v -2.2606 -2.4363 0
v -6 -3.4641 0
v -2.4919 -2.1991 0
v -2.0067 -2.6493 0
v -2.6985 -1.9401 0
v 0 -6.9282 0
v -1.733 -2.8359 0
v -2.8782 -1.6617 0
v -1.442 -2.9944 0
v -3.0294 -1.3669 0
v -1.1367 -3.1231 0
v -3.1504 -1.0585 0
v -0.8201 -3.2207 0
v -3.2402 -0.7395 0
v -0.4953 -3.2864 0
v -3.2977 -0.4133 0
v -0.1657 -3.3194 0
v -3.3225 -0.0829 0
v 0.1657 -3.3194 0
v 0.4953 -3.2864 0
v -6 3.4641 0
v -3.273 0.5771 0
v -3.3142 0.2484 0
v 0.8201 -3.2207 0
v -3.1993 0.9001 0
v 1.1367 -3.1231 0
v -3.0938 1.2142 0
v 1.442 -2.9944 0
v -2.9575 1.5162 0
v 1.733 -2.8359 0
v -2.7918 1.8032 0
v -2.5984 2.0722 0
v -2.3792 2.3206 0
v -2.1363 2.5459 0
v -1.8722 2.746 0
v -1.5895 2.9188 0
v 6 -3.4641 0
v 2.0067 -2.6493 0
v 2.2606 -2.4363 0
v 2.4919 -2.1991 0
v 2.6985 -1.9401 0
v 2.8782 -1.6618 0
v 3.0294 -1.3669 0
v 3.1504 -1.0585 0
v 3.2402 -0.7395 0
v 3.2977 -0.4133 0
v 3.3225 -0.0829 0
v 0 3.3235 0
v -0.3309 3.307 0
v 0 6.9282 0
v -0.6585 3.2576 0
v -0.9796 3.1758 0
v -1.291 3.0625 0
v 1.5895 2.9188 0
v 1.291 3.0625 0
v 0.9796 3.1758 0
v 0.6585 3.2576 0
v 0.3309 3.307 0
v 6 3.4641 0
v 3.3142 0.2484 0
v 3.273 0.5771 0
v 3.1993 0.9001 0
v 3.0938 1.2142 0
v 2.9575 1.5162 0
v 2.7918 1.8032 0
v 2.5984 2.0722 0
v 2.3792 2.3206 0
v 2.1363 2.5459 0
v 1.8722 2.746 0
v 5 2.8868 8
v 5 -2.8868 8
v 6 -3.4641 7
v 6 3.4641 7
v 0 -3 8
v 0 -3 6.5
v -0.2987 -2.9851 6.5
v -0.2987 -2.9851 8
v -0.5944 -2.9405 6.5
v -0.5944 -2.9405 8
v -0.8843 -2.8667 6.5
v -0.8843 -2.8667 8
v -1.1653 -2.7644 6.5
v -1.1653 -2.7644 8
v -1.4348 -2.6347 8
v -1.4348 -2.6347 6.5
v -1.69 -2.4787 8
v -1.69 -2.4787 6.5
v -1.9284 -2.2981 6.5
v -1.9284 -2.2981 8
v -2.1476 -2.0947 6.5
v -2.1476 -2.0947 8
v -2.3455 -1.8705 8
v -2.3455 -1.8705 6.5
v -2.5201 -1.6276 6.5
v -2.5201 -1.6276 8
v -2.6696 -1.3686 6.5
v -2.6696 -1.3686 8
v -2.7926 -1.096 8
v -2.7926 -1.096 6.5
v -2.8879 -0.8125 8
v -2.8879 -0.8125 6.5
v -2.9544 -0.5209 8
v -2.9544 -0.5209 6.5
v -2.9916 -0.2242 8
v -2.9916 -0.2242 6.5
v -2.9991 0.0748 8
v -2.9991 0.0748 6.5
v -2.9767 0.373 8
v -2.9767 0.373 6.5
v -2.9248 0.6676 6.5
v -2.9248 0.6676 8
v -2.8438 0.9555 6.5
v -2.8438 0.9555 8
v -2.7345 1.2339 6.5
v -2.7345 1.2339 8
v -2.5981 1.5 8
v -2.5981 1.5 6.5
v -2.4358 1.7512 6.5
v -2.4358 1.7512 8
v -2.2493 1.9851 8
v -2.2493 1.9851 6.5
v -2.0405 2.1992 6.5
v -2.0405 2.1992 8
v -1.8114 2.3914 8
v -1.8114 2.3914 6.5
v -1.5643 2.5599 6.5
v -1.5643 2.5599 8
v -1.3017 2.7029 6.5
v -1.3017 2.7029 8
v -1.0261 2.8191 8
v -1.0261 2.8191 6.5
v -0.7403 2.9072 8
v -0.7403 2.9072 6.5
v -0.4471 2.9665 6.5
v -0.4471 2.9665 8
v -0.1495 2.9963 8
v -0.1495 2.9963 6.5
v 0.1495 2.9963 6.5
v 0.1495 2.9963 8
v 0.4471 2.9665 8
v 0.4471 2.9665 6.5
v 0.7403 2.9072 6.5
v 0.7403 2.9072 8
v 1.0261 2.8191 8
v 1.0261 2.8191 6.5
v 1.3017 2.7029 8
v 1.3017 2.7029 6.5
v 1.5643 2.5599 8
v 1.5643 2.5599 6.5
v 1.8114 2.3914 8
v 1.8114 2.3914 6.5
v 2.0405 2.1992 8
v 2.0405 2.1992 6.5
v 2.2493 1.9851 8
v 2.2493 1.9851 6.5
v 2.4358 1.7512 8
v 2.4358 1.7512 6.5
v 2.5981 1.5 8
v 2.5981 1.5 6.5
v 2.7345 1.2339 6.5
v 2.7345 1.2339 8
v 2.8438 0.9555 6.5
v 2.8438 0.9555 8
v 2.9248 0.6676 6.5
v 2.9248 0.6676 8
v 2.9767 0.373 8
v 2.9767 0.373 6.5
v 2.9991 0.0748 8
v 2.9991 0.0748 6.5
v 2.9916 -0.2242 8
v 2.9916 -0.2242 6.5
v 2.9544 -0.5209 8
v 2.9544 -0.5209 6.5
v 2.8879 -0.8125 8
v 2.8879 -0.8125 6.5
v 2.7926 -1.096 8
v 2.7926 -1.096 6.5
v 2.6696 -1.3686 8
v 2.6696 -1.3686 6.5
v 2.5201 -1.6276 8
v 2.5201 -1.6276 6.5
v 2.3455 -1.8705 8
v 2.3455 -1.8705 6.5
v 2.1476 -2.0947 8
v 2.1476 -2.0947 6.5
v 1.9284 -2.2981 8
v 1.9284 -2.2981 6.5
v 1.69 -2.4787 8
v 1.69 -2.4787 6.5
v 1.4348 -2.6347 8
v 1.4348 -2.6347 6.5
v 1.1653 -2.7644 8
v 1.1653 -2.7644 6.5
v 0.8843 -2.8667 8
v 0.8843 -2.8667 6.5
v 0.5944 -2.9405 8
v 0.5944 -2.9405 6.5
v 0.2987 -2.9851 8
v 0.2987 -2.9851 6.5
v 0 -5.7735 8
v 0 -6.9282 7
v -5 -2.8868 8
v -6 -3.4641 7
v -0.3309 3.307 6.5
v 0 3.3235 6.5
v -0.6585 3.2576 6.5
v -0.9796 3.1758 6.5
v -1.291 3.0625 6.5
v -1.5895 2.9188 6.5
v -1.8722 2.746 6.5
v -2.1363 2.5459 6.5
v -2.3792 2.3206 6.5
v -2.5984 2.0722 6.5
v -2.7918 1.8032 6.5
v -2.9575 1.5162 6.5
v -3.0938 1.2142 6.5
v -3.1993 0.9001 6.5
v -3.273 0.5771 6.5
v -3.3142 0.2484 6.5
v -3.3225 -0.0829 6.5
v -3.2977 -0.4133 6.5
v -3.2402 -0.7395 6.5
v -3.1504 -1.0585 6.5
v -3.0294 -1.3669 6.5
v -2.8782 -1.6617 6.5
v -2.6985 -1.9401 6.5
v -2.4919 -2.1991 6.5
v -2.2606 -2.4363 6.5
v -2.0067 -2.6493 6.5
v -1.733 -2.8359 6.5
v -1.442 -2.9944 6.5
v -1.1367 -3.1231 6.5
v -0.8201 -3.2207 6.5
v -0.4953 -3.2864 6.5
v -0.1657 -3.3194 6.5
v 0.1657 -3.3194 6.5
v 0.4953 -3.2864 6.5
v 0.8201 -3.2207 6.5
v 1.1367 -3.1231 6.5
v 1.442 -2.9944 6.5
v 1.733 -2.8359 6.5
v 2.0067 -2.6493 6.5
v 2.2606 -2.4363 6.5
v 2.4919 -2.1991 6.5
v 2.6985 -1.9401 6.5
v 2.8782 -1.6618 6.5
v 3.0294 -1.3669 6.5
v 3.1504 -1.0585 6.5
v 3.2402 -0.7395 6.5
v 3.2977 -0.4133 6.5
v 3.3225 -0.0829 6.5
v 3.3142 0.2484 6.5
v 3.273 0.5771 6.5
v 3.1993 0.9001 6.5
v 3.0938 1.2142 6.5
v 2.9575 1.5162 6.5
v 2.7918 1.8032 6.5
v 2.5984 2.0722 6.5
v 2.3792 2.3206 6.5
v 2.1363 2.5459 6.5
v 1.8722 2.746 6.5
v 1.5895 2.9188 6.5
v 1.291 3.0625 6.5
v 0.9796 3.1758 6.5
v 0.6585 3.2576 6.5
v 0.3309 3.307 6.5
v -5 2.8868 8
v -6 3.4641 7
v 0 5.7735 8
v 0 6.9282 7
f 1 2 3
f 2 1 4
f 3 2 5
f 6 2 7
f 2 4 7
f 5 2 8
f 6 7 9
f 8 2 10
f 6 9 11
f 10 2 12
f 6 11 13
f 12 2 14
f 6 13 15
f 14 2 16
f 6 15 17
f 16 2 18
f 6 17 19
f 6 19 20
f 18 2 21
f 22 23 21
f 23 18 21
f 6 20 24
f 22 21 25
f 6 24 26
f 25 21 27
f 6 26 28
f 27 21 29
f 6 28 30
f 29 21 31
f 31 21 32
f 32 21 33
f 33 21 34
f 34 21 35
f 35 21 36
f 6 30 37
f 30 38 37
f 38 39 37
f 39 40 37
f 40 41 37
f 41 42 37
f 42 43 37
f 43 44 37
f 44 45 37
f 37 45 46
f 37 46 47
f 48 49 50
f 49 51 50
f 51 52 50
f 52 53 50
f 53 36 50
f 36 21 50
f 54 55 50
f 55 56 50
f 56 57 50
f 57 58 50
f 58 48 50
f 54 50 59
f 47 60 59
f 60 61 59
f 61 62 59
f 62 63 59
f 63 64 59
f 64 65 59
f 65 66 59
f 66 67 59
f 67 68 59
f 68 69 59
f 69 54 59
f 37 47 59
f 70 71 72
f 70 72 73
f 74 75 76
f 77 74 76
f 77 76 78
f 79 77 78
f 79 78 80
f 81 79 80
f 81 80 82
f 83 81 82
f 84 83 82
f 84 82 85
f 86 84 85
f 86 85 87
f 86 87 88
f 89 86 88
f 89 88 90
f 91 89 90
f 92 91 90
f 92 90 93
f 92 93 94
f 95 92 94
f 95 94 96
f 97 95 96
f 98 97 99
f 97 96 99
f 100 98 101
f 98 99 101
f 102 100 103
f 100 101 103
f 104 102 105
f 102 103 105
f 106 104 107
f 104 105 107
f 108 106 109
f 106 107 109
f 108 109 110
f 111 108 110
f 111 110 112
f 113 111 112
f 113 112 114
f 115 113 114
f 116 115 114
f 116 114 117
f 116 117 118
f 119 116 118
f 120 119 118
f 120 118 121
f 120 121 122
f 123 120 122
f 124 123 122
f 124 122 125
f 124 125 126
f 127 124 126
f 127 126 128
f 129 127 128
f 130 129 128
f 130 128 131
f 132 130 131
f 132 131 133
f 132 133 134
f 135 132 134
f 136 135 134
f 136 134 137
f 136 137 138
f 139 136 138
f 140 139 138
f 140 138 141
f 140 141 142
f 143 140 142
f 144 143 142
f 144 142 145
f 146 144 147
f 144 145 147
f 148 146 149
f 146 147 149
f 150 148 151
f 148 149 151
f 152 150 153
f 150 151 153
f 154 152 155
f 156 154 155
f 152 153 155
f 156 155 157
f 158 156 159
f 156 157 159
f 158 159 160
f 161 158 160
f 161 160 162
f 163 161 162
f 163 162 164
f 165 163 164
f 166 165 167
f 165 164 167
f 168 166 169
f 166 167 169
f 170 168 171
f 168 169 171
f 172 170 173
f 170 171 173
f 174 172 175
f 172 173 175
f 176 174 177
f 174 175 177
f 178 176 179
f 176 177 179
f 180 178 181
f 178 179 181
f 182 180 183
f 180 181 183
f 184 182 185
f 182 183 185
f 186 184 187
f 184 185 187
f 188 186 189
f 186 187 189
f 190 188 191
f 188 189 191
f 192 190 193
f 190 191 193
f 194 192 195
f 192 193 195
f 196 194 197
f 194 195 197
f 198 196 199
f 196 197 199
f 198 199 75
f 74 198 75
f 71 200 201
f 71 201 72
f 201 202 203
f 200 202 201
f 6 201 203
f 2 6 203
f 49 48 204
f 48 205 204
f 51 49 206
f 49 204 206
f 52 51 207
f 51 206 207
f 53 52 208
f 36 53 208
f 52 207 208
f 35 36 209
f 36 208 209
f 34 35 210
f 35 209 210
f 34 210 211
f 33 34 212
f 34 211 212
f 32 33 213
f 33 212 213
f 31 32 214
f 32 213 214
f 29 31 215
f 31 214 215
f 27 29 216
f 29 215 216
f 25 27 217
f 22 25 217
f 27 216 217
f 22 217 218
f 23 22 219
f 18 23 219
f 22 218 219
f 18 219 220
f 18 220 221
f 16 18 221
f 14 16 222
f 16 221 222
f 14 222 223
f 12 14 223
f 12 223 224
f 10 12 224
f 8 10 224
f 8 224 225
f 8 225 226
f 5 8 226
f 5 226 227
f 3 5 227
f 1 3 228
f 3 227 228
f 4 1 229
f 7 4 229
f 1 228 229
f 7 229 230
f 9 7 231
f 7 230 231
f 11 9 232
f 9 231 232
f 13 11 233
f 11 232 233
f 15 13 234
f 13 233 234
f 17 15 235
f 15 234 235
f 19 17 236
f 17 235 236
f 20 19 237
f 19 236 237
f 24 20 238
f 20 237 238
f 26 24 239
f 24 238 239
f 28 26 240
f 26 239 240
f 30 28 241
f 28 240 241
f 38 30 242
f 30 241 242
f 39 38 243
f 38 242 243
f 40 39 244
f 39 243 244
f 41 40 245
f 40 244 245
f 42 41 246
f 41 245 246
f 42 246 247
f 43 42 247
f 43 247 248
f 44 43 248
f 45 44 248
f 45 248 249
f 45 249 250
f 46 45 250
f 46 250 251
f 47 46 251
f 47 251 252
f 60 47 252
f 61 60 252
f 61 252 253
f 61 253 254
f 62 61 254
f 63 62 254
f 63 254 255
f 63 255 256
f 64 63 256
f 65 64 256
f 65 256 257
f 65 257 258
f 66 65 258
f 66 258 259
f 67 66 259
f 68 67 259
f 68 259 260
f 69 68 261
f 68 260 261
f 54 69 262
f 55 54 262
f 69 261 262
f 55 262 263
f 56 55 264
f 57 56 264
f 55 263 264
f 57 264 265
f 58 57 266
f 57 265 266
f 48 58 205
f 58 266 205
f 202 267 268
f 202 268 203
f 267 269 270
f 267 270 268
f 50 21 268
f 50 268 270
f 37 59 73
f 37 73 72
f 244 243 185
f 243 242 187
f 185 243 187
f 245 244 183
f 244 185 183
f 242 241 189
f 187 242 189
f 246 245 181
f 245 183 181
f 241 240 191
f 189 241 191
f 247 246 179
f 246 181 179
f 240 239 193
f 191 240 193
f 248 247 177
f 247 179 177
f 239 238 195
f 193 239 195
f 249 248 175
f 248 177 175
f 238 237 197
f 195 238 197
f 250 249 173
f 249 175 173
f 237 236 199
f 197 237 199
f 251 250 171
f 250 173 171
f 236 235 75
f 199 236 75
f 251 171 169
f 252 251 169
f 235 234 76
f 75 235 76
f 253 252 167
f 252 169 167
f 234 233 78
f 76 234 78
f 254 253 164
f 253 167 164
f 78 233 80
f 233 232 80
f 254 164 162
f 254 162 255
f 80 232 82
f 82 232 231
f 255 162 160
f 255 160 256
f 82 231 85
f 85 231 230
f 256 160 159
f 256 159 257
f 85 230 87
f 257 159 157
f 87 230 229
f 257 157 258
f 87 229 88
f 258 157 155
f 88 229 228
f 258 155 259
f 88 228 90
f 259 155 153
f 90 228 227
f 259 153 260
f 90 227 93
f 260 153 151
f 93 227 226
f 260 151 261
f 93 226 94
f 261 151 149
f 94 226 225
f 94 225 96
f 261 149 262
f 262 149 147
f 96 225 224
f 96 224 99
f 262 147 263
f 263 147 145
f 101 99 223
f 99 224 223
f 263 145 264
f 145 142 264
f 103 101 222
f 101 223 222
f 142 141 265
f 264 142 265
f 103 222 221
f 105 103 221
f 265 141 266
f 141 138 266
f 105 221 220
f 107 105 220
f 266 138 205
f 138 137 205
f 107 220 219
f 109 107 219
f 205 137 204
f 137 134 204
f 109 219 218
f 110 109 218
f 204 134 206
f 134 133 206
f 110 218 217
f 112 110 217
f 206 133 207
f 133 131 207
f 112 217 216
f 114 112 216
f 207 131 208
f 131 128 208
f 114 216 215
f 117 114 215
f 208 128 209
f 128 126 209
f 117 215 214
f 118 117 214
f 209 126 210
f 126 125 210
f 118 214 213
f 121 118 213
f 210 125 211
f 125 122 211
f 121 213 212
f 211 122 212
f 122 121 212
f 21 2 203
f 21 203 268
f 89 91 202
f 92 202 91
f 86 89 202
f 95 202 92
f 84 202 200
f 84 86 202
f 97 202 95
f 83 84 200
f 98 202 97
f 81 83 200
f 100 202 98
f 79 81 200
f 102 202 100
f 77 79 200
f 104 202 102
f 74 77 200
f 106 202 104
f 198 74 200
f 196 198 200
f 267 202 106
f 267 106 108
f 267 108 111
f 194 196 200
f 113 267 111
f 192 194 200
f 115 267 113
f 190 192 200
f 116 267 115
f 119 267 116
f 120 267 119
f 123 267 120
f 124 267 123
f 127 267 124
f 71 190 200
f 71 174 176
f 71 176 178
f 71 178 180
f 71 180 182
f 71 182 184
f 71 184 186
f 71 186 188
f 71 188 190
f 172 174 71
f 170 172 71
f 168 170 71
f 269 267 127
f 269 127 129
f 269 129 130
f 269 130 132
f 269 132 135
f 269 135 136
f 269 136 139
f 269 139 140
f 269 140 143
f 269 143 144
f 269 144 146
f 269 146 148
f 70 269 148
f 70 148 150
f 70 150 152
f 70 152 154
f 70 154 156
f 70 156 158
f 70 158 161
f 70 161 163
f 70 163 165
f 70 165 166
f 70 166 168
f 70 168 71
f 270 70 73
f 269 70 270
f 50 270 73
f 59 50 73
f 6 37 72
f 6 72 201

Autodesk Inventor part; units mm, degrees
ref_plane "YZ Plane" through (0, 0, 0) normal (1, 0, 0) x (0, 1, 0)
ref_plane "XZ Plane" through (0, 0, 0) normal (0, 1, 0) x (-1, 0, 0)
ref_plane "XY Plane" through (0, 0, 0) normal (0, 0, 1) x (1, 0, 0)
sketch "Sketch1" plane through (0, 0, 0) normal (0, 0, 1) x (1, 0, 0)
  line L0 (0, 6.9282) -> (6, 3.4641)
  line L1 (6, 3.4641) -> (6, -3.4641)
  line L2 (6, -3.4641) -> (0, -6.9282)
  line L3 (0, -6.9282) -> (-6, -3.4641)
  line L4 (-6, -3.4641) -> (-6, 3.4641)
  line L5 (-6, 3.4641) -> (0, 6.9282)
  point P0 (0, 0)
  point P1 (0, 0)
  point P2 (-6, 0)
  dimension "d0" = 12
extrude "Extrusion1" add sketch "Sketch1" along normal blind 8
chamfer "Chamfer1" distance 1 angle 45 6 edges at (-3, 5.1962, 8) (3, 5.1962, 8) (6, 0, 8) (3, -5.1962, 8) (-3, -5.1962, 8) (-6, 0, 8)
sketch "Sketch2" plane through (0, 0, 8) normal (0, 0, 1) x (1, 0, 0)
  point P0 (0, 0)
  point P1 (0, 0)
hole "Hole1" at (0, 0, 8) direction (0, 0, -1) diameter 6 depth 1.5
sketch "Sketch3" plane through (0, 0, 0) normal (0, 0, -1) x (-1, 0, 0)
  point P0 (0, 0)
  point P1 (0, 0)
hole "Hole2" at (0, 0, 0) direction (0, 0, 1) diameter 6.647 depth 6.5 thread size "M8x1.25" class "6H" standard "ISO Metric profile"
properties part number "50" material "Steel, Alloy"
